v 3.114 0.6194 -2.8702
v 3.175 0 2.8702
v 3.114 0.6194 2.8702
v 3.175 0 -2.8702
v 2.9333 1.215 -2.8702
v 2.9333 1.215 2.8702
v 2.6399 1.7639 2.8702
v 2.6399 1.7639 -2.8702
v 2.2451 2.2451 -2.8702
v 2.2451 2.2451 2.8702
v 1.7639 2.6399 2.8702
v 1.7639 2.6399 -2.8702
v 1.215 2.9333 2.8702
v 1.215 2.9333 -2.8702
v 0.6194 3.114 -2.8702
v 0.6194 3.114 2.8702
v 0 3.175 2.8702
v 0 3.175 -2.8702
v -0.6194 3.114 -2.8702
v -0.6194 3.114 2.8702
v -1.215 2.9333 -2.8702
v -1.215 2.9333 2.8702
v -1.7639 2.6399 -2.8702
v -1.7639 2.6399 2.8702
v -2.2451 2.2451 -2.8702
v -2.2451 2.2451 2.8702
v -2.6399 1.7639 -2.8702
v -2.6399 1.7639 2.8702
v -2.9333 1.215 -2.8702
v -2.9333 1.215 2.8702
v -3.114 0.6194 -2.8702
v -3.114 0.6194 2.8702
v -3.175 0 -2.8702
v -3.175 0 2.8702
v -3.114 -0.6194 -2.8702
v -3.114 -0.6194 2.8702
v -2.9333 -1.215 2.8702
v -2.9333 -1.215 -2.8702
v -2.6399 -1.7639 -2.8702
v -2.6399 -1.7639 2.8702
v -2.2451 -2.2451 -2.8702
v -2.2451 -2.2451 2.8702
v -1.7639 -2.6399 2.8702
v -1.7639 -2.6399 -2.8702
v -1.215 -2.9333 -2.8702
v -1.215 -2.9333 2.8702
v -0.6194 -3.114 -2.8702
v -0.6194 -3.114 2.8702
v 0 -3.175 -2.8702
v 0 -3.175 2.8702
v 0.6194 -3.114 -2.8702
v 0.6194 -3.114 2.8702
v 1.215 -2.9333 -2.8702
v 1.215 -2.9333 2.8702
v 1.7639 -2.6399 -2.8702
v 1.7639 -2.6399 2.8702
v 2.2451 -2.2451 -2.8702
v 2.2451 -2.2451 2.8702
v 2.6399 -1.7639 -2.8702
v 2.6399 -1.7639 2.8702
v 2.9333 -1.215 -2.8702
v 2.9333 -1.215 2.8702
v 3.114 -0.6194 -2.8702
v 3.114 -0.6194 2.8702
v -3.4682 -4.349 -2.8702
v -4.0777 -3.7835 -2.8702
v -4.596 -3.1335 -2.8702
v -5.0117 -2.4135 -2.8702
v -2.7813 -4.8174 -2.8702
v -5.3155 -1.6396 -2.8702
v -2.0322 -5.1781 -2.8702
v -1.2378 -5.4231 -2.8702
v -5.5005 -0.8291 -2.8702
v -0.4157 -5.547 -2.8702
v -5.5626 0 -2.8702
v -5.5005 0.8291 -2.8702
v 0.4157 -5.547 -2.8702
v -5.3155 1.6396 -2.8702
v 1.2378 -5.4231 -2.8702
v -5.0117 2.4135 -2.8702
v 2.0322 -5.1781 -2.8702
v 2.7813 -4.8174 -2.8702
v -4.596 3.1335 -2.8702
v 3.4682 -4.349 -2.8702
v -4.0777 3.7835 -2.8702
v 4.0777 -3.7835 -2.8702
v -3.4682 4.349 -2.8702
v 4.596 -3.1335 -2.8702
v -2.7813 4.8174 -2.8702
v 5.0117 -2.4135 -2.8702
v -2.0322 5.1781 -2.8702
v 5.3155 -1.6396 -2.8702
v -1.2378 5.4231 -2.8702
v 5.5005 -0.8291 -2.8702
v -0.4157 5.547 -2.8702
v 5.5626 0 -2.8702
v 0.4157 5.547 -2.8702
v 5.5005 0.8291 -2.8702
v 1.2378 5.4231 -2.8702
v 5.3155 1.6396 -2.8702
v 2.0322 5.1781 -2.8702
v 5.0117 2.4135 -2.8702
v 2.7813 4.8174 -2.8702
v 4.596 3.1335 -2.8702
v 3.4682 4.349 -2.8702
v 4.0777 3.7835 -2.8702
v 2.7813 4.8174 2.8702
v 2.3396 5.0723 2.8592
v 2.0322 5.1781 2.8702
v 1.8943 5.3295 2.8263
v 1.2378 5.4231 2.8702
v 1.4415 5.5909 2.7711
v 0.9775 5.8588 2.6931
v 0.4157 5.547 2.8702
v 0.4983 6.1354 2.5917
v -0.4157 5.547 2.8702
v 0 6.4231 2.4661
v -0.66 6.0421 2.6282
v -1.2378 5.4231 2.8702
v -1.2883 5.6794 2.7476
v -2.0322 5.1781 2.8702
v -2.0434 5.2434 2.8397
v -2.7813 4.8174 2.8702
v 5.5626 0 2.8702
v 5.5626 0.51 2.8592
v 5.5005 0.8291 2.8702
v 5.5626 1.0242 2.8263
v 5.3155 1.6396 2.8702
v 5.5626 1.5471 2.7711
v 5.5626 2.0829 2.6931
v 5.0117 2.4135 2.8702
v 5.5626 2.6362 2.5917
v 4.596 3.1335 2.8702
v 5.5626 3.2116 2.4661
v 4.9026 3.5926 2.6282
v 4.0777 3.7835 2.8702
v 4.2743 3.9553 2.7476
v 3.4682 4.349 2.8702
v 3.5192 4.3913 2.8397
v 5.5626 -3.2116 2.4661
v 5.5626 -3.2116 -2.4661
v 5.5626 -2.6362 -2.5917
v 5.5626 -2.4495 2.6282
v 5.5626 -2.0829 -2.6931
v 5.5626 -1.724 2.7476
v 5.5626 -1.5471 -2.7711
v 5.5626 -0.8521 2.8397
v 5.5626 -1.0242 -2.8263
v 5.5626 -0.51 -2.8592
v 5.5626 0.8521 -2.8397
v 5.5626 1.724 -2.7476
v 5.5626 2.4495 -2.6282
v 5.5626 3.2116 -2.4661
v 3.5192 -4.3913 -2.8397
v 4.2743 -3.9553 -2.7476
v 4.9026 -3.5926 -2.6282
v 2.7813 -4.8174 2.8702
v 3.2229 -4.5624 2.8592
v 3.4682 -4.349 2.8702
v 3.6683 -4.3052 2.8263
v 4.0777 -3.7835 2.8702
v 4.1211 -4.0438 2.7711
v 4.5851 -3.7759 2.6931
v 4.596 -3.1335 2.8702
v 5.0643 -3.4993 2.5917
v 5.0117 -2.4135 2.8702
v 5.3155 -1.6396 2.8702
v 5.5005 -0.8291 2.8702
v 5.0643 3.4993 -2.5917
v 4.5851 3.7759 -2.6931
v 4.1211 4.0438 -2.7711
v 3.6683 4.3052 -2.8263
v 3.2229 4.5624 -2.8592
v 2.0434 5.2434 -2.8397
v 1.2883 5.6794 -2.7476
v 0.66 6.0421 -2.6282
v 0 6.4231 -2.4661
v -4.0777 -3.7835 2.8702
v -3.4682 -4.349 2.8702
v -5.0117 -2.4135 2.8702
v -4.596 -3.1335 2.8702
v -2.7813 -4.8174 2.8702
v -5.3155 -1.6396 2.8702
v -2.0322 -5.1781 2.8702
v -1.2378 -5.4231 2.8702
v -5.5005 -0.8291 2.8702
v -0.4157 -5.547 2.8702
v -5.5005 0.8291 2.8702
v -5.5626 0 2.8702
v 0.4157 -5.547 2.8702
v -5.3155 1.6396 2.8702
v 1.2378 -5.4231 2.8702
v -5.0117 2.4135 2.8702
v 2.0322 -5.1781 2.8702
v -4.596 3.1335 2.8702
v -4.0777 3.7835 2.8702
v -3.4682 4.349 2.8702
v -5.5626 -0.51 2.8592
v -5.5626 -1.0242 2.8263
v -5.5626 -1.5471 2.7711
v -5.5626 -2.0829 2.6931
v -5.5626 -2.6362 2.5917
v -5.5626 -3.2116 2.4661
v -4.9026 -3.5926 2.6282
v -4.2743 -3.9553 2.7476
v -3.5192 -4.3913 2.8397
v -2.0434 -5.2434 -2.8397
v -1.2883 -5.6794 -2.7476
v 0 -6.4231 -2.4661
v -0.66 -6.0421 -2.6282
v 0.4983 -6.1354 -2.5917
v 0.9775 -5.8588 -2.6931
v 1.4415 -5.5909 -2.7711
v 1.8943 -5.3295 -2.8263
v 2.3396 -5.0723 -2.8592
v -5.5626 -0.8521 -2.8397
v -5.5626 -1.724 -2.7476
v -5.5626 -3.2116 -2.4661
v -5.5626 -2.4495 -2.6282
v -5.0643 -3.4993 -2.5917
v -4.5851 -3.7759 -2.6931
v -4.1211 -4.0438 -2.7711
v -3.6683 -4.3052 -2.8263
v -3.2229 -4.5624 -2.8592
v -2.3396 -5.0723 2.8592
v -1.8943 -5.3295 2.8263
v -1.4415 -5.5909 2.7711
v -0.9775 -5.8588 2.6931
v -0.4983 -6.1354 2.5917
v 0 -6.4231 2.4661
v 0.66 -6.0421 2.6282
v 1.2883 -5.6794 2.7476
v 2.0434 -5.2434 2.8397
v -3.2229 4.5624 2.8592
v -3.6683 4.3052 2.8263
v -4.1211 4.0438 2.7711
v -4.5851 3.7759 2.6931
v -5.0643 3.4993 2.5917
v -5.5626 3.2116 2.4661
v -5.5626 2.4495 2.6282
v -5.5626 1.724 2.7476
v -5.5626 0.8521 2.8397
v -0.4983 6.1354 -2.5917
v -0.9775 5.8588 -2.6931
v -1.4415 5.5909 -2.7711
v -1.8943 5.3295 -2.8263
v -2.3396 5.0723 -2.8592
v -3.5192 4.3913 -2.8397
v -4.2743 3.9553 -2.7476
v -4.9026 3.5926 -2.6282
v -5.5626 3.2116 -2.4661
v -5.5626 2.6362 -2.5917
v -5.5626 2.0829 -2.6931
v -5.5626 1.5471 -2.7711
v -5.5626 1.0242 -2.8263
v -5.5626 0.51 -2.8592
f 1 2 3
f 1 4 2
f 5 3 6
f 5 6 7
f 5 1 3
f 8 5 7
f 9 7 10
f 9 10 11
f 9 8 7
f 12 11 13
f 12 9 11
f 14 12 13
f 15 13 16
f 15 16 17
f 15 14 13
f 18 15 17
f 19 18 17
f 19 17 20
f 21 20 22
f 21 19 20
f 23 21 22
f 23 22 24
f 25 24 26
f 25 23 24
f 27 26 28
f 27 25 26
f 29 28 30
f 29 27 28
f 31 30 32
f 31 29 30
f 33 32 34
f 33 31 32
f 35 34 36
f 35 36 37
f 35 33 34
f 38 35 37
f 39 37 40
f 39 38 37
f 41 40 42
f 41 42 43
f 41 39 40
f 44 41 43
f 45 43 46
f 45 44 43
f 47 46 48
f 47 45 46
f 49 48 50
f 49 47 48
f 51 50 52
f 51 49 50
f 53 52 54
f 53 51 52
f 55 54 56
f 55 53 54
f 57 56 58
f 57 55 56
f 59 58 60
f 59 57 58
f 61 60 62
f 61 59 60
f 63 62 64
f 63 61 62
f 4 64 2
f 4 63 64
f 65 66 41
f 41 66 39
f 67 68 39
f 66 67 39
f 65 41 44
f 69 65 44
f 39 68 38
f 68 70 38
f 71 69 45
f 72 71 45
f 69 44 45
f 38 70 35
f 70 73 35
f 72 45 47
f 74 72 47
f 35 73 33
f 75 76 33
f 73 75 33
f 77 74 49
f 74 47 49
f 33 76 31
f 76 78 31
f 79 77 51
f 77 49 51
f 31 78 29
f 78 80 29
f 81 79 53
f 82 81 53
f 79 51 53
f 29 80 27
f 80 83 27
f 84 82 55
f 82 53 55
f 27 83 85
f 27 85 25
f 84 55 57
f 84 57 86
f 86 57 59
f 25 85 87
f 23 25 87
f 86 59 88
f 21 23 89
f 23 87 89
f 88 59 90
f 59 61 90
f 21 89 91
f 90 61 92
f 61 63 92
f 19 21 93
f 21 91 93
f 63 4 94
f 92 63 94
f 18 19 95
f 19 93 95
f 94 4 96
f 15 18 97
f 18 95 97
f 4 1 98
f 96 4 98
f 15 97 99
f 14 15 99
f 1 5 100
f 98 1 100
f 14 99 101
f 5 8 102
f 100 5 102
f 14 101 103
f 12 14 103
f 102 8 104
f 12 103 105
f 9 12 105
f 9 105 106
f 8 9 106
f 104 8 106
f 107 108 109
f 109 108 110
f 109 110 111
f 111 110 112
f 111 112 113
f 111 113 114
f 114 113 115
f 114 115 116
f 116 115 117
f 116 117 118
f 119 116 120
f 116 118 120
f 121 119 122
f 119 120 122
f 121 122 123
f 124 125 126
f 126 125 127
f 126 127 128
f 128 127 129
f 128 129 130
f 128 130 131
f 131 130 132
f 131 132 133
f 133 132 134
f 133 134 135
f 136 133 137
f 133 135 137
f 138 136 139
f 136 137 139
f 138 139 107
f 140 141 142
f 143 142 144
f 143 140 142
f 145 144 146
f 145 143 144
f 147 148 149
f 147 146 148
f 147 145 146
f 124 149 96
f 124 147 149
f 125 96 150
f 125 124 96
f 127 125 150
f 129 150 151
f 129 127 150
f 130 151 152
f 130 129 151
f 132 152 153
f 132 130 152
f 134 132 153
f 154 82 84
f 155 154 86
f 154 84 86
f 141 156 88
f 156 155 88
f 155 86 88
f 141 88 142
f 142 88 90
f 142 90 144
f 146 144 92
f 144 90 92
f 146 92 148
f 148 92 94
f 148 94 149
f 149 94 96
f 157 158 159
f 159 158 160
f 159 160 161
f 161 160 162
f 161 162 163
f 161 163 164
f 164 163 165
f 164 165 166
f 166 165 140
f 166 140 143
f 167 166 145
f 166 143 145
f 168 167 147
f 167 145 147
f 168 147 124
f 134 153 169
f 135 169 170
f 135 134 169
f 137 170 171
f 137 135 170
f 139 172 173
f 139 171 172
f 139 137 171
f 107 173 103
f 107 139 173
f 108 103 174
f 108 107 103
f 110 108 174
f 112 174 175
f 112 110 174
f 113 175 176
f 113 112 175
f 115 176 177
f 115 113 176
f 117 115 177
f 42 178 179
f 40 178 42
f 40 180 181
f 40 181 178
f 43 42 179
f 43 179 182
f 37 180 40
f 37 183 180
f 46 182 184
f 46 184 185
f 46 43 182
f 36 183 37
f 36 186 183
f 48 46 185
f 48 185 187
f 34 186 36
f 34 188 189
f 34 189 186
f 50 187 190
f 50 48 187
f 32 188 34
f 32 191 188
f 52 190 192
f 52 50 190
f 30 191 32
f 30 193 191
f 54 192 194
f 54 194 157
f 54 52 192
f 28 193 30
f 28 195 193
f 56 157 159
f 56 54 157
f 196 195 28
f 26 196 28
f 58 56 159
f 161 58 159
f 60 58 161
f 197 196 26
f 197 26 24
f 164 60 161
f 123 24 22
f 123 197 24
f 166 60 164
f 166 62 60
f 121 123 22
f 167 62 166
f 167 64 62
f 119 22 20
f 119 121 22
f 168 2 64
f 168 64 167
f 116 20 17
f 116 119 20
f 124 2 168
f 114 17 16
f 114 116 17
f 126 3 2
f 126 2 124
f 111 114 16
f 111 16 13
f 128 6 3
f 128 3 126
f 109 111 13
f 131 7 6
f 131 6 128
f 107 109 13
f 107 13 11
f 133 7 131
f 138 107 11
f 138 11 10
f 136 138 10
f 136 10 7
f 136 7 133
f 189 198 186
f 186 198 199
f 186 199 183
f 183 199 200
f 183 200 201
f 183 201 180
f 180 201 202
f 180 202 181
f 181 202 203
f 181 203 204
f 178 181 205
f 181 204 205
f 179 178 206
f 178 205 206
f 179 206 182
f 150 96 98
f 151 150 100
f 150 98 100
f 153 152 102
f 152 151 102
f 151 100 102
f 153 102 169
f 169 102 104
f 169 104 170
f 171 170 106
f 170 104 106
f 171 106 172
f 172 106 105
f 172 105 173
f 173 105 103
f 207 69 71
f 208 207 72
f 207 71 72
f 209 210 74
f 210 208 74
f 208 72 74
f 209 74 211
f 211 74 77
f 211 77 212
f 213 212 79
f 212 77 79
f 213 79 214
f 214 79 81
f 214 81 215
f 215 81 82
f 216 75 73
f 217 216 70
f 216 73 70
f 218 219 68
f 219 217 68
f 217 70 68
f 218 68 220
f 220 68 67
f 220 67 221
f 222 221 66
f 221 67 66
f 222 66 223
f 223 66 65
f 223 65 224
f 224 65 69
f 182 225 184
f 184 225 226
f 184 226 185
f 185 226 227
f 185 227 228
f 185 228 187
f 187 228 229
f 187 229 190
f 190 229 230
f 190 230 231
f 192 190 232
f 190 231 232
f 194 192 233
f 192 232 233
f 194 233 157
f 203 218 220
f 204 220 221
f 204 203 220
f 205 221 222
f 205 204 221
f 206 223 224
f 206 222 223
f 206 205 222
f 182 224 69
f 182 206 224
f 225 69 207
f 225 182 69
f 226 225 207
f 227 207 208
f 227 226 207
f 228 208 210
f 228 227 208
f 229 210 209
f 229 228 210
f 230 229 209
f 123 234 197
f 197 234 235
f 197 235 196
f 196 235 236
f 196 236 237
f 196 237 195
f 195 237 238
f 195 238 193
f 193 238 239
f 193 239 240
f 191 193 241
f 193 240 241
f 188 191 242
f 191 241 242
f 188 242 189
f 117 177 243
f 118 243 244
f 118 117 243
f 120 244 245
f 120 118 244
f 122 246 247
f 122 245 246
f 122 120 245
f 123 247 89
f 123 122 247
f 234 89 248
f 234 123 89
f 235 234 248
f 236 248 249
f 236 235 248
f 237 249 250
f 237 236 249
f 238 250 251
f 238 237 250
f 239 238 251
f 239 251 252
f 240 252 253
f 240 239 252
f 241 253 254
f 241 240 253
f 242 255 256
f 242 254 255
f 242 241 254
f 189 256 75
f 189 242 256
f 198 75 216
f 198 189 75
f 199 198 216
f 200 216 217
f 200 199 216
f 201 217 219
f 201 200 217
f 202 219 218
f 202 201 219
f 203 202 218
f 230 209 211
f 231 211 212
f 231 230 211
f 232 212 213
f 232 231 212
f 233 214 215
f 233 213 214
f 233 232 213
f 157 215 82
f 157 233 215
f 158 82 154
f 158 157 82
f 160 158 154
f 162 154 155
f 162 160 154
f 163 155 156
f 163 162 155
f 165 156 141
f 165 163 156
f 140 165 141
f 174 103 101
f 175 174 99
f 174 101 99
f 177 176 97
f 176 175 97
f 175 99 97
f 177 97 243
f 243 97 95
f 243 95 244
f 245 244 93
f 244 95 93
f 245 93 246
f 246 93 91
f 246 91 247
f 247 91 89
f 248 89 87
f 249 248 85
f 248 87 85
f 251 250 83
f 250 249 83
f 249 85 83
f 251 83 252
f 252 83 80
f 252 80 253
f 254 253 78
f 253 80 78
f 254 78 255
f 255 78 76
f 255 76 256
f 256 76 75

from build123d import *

# Parameters (mm, degrees)
F0_R     = 3.175
F1_DEPTH = 2.8702


with BuildPart() as f1:
    # F0 (on Top) → F1 (new body, symmetric)
    with BuildSketch(Plane.XY):
        Polygon((0, -6.423137), (5.5626, -3.211569), (5.5626, 3.211569), (0, 6.423137), (-5.5626, 3.211569), (-5.5626, -3.211569), align=None)
        Circle(F0_R, mode=Mode.SUBTRACT)
    extrude(amount=F1_DEPTH, both=True)

    # F2 (on Front) → F3 (revolve, cut)
    with BuildSketch(Plane.XZ):
        Polygon((6.773051, 2.8702), (5.5626, 2.8702), (6.773051, 2.301839), align=None)
    revolve(axis=Axis((0, 0, 2.8702), (0, 0, 1)), mode=Mode.SUBTRACT)

    # F2 (on Front) → F4 (revolve, cut)
    with BuildSketch(Plane.XZ):
        Polygon((6.773051, -2.8702), (6.773051, -2.301839), (5.5626, -2.8702), align=None)
    revolve(axis=Axis((0, 0, -2.8702), (0, 0, 1)), mode=Mode.SUBTRACT)


solid = f1.part
